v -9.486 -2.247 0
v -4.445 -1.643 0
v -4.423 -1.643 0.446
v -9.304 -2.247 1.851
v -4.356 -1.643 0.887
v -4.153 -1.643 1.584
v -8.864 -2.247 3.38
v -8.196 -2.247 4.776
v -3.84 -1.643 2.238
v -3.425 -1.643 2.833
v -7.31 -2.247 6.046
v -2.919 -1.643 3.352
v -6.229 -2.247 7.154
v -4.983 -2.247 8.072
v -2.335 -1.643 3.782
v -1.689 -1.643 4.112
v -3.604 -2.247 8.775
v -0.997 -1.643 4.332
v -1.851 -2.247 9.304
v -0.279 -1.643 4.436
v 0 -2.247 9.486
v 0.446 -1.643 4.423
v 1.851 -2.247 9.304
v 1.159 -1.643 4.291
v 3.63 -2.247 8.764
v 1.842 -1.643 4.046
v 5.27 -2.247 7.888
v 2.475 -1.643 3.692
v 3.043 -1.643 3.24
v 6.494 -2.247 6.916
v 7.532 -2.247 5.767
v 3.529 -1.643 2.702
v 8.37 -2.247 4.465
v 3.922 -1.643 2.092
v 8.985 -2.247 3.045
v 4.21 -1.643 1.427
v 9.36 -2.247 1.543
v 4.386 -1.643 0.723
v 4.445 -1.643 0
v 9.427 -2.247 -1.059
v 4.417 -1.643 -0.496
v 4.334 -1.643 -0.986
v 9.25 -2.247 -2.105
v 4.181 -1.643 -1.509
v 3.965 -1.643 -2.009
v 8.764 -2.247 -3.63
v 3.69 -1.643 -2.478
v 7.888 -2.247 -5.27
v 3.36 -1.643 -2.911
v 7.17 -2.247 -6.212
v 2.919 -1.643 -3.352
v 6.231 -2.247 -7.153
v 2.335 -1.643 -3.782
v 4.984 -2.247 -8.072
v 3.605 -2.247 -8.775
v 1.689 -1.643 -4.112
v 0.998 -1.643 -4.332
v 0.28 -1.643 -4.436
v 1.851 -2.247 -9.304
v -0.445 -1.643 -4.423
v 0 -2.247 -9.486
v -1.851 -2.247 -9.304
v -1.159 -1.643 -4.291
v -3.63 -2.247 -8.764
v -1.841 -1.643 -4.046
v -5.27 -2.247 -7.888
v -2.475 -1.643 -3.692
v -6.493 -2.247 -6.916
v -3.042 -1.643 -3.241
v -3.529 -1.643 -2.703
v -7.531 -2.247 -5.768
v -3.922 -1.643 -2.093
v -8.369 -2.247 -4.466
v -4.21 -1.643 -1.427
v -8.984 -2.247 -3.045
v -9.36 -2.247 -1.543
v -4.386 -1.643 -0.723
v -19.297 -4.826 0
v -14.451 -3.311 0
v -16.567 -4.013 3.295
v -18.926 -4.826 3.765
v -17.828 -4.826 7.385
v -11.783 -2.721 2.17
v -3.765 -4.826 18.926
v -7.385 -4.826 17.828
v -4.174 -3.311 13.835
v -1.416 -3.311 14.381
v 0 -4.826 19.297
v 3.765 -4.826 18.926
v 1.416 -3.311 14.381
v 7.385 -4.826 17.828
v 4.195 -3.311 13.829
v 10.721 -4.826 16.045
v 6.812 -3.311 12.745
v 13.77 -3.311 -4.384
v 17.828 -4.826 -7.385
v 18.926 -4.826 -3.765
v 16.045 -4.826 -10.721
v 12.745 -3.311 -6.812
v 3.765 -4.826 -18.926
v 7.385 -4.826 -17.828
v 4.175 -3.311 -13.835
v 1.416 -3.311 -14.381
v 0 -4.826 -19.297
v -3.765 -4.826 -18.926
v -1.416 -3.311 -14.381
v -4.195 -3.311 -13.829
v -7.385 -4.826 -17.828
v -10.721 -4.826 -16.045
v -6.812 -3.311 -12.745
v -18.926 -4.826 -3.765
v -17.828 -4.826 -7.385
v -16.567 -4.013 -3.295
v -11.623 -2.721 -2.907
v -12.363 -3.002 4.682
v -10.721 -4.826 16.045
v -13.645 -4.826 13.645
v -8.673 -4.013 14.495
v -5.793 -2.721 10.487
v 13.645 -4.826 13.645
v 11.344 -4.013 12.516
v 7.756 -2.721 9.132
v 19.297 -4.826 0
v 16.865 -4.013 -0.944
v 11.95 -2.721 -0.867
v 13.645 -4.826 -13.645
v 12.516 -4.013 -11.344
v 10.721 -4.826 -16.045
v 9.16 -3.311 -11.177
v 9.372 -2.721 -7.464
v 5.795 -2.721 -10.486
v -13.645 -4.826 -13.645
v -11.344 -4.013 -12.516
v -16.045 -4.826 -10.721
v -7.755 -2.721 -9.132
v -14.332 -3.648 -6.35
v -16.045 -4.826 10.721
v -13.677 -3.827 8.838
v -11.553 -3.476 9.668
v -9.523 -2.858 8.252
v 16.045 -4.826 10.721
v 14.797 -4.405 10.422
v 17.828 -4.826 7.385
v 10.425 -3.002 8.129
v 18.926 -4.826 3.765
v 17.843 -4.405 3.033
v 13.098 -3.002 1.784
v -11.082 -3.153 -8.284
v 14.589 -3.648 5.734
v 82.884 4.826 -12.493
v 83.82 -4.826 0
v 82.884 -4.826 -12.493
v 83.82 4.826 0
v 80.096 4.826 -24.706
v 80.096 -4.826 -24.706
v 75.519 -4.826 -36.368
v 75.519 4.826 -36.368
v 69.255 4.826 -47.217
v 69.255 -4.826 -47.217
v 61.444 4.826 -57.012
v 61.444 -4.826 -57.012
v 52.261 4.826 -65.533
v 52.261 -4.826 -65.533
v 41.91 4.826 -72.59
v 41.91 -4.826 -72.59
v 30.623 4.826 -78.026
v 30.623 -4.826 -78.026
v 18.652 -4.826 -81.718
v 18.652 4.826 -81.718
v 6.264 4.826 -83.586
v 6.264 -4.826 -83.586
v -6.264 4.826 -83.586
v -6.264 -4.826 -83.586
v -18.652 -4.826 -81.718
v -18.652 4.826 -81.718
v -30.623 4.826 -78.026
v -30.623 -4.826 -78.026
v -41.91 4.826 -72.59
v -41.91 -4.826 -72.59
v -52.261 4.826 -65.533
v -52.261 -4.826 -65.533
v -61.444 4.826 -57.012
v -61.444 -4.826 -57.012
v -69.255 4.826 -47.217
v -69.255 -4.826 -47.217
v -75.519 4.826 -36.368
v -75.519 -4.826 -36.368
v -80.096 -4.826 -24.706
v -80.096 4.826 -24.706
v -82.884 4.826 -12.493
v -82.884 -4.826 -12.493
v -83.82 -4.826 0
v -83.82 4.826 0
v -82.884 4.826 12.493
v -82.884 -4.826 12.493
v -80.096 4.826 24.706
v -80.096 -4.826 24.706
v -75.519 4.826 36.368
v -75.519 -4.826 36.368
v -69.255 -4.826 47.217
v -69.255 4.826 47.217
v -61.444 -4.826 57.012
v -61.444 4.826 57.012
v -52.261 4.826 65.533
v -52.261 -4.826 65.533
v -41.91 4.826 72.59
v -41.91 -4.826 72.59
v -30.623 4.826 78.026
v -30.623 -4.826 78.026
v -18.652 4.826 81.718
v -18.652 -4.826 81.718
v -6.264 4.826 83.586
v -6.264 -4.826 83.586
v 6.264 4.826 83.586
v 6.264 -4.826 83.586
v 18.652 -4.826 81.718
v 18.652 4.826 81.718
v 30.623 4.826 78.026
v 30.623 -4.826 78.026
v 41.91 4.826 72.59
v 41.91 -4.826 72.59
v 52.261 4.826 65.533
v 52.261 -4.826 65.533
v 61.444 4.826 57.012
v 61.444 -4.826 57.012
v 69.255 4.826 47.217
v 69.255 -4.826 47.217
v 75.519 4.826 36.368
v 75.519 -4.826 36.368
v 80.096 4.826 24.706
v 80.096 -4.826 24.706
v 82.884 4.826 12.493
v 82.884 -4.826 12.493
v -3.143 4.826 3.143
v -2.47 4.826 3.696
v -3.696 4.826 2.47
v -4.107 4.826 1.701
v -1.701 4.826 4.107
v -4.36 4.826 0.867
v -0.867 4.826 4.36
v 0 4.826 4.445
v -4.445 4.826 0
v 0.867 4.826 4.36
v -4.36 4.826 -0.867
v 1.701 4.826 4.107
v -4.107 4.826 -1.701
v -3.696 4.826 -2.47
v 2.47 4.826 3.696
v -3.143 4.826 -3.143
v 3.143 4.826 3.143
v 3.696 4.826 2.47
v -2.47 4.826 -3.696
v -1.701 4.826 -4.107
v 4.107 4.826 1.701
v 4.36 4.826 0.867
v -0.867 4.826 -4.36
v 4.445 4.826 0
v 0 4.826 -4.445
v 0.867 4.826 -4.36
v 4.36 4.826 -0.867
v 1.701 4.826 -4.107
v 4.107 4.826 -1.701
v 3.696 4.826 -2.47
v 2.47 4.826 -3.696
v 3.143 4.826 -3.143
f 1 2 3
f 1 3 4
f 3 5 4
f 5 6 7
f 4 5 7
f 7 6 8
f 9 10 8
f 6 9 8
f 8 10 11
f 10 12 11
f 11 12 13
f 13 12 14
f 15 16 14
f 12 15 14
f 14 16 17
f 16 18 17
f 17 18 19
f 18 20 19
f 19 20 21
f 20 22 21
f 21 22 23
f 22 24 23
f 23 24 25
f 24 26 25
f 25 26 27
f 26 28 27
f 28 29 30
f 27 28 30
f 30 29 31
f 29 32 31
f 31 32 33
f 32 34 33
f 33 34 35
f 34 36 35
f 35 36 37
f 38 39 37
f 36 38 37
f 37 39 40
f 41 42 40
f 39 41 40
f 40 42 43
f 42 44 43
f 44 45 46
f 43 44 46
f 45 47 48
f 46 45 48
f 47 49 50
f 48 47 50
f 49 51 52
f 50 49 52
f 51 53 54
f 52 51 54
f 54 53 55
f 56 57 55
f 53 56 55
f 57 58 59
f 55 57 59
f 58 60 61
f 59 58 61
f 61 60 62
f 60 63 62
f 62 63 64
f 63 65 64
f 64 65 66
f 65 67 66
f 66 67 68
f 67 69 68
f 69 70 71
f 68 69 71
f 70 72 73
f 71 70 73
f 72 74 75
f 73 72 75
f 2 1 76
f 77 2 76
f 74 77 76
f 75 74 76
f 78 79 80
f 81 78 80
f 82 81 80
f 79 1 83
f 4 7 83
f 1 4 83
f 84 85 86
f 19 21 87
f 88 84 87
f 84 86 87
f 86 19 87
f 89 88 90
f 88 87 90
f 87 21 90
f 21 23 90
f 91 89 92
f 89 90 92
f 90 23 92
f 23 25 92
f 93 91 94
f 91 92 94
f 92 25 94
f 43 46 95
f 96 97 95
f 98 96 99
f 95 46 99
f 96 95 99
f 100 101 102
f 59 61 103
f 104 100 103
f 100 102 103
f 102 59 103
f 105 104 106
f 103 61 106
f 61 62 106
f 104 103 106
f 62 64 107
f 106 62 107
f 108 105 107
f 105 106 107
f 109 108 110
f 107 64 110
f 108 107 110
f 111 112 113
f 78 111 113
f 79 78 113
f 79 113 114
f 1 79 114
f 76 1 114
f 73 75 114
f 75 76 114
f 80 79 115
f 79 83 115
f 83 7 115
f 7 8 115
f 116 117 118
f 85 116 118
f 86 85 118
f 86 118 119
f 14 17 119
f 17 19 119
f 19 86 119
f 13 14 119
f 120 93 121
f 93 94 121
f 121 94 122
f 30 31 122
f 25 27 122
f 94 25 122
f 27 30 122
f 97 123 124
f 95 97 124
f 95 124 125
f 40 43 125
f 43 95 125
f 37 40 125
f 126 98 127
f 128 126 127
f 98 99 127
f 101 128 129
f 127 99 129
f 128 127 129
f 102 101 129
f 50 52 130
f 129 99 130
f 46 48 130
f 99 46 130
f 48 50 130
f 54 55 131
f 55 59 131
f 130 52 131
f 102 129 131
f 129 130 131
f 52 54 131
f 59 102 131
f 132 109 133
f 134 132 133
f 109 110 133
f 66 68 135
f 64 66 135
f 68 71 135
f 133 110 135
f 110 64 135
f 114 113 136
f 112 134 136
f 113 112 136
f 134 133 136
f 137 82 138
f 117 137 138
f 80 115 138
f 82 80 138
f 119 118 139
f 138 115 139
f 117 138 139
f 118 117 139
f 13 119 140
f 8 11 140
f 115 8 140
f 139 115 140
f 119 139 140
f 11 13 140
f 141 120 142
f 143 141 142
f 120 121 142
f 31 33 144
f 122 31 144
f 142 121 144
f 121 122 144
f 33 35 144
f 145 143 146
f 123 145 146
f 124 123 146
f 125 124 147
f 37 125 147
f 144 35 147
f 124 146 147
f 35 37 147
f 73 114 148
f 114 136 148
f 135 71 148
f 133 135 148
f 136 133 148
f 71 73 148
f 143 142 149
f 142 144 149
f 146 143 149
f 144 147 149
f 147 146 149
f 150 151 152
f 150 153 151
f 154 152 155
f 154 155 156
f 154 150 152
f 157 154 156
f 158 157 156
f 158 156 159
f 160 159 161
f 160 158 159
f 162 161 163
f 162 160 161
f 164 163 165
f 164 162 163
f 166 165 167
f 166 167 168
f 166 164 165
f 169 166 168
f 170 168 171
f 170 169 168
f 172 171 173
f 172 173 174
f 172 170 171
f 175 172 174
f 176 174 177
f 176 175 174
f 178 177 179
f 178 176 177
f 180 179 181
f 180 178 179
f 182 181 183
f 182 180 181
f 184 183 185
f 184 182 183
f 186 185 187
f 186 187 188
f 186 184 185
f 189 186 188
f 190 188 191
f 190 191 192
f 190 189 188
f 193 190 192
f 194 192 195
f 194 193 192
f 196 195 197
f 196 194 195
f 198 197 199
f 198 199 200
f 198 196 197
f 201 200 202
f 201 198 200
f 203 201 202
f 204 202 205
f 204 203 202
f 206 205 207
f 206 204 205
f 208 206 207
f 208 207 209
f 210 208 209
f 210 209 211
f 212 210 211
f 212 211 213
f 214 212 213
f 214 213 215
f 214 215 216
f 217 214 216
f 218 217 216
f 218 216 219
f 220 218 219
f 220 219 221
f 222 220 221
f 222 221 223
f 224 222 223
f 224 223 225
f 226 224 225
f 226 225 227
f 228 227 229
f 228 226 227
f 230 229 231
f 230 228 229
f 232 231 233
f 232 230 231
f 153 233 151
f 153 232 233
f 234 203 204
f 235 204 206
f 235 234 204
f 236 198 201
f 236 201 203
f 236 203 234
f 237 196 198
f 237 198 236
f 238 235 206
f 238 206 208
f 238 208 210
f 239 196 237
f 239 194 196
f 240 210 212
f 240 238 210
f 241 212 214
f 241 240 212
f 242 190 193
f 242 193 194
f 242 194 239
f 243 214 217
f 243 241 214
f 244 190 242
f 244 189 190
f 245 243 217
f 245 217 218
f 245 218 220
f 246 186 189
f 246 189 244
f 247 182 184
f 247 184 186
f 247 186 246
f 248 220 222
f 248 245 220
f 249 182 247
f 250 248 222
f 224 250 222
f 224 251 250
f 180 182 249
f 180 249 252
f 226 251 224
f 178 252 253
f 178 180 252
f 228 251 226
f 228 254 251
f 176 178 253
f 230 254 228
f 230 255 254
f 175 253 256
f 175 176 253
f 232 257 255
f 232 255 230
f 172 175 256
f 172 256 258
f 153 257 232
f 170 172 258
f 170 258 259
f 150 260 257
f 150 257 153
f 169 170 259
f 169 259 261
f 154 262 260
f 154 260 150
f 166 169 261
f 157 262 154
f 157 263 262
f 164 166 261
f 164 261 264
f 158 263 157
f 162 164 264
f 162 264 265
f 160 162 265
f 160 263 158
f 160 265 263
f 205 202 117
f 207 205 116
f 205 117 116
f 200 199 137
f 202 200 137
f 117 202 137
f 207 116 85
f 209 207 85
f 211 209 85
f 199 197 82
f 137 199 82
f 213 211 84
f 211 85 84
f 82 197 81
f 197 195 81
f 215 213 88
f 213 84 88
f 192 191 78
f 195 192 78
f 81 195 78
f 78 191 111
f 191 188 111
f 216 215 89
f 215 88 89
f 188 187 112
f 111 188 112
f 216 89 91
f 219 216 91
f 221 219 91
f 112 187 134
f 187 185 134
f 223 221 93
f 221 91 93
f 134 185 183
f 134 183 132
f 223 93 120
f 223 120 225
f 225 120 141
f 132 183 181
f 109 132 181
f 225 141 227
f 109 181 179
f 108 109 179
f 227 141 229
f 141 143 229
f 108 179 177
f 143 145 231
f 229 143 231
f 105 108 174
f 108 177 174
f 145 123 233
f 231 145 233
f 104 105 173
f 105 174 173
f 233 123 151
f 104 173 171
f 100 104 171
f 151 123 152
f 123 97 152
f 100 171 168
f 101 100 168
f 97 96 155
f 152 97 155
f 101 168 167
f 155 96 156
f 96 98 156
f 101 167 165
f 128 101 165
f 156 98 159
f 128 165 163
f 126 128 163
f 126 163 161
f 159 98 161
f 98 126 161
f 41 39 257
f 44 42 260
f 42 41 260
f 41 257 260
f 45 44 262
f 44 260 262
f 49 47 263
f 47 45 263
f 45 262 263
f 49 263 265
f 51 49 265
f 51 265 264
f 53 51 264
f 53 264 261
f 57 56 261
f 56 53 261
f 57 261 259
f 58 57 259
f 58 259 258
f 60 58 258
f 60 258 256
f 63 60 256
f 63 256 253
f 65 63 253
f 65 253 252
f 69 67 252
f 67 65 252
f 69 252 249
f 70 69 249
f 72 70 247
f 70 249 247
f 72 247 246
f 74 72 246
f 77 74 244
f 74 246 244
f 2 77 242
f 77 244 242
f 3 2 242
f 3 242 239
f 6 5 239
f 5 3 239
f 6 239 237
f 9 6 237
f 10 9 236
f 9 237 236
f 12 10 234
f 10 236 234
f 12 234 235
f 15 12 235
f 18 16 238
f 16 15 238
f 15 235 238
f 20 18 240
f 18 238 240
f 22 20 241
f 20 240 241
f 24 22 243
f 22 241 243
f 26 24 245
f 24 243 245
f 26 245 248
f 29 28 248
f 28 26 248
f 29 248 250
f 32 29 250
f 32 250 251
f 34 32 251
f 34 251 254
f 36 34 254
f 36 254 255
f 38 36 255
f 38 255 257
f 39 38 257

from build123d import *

# Parameters (mm, degrees)
SKETCH1_R           = 83.82
BOSS_EXTRUDE1_DEPTH = 4.826
SKETCH3_R           = 4.445
CUT_EXTRUDE1_DEPTH  = 9.652


with BuildPart() as part:
    # Sketch1 → Boss-Extrude1 (new body, symmetric)
    with BuildSketch(Plane(origin=(0, 0, 0), x_dir=(1, 0, 0), z_dir=(0, 1, 0))):
        Circle(SKETCH1_R)
    extrude(amount=BOSS_EXTRUDE1_DEPTH, both=True)

    # Sketch2 → Cut-Revolve1 (revolve, cut)
    with BuildSketch(Plane.XY):
        with BuildLine():
            Line((0, -4.826), (-19.2970404, -4.826))
            ThreePointArc((-19.2970404, -4.826), (-9.985310315, -2.33207385), (-0.381787908, -1.495209354))
            Line((-0.381787908, -1.495209354), (0, -1.495209354))
            Line((0, -1.495209354), (0, -4.826))
        make_face()
    revolve(axis=Axis((0, -18.327530441, 0), (0, 1, 0)), mode=Mode.SUBTRACT)

    # Sketch3 → Cut-Extrude1 (cut)
    with BuildSketch(Plane(origin=(0, 4.826, 0), x_dir=(1, 0, 0), z_dir=(0, 1, 0))):
        Circle(SKETCH3_R)
    extrude(amount=-CUT_EXTRUDE1_DEPTH, mode=Mode.SUBTRACT)


solid = part.part
